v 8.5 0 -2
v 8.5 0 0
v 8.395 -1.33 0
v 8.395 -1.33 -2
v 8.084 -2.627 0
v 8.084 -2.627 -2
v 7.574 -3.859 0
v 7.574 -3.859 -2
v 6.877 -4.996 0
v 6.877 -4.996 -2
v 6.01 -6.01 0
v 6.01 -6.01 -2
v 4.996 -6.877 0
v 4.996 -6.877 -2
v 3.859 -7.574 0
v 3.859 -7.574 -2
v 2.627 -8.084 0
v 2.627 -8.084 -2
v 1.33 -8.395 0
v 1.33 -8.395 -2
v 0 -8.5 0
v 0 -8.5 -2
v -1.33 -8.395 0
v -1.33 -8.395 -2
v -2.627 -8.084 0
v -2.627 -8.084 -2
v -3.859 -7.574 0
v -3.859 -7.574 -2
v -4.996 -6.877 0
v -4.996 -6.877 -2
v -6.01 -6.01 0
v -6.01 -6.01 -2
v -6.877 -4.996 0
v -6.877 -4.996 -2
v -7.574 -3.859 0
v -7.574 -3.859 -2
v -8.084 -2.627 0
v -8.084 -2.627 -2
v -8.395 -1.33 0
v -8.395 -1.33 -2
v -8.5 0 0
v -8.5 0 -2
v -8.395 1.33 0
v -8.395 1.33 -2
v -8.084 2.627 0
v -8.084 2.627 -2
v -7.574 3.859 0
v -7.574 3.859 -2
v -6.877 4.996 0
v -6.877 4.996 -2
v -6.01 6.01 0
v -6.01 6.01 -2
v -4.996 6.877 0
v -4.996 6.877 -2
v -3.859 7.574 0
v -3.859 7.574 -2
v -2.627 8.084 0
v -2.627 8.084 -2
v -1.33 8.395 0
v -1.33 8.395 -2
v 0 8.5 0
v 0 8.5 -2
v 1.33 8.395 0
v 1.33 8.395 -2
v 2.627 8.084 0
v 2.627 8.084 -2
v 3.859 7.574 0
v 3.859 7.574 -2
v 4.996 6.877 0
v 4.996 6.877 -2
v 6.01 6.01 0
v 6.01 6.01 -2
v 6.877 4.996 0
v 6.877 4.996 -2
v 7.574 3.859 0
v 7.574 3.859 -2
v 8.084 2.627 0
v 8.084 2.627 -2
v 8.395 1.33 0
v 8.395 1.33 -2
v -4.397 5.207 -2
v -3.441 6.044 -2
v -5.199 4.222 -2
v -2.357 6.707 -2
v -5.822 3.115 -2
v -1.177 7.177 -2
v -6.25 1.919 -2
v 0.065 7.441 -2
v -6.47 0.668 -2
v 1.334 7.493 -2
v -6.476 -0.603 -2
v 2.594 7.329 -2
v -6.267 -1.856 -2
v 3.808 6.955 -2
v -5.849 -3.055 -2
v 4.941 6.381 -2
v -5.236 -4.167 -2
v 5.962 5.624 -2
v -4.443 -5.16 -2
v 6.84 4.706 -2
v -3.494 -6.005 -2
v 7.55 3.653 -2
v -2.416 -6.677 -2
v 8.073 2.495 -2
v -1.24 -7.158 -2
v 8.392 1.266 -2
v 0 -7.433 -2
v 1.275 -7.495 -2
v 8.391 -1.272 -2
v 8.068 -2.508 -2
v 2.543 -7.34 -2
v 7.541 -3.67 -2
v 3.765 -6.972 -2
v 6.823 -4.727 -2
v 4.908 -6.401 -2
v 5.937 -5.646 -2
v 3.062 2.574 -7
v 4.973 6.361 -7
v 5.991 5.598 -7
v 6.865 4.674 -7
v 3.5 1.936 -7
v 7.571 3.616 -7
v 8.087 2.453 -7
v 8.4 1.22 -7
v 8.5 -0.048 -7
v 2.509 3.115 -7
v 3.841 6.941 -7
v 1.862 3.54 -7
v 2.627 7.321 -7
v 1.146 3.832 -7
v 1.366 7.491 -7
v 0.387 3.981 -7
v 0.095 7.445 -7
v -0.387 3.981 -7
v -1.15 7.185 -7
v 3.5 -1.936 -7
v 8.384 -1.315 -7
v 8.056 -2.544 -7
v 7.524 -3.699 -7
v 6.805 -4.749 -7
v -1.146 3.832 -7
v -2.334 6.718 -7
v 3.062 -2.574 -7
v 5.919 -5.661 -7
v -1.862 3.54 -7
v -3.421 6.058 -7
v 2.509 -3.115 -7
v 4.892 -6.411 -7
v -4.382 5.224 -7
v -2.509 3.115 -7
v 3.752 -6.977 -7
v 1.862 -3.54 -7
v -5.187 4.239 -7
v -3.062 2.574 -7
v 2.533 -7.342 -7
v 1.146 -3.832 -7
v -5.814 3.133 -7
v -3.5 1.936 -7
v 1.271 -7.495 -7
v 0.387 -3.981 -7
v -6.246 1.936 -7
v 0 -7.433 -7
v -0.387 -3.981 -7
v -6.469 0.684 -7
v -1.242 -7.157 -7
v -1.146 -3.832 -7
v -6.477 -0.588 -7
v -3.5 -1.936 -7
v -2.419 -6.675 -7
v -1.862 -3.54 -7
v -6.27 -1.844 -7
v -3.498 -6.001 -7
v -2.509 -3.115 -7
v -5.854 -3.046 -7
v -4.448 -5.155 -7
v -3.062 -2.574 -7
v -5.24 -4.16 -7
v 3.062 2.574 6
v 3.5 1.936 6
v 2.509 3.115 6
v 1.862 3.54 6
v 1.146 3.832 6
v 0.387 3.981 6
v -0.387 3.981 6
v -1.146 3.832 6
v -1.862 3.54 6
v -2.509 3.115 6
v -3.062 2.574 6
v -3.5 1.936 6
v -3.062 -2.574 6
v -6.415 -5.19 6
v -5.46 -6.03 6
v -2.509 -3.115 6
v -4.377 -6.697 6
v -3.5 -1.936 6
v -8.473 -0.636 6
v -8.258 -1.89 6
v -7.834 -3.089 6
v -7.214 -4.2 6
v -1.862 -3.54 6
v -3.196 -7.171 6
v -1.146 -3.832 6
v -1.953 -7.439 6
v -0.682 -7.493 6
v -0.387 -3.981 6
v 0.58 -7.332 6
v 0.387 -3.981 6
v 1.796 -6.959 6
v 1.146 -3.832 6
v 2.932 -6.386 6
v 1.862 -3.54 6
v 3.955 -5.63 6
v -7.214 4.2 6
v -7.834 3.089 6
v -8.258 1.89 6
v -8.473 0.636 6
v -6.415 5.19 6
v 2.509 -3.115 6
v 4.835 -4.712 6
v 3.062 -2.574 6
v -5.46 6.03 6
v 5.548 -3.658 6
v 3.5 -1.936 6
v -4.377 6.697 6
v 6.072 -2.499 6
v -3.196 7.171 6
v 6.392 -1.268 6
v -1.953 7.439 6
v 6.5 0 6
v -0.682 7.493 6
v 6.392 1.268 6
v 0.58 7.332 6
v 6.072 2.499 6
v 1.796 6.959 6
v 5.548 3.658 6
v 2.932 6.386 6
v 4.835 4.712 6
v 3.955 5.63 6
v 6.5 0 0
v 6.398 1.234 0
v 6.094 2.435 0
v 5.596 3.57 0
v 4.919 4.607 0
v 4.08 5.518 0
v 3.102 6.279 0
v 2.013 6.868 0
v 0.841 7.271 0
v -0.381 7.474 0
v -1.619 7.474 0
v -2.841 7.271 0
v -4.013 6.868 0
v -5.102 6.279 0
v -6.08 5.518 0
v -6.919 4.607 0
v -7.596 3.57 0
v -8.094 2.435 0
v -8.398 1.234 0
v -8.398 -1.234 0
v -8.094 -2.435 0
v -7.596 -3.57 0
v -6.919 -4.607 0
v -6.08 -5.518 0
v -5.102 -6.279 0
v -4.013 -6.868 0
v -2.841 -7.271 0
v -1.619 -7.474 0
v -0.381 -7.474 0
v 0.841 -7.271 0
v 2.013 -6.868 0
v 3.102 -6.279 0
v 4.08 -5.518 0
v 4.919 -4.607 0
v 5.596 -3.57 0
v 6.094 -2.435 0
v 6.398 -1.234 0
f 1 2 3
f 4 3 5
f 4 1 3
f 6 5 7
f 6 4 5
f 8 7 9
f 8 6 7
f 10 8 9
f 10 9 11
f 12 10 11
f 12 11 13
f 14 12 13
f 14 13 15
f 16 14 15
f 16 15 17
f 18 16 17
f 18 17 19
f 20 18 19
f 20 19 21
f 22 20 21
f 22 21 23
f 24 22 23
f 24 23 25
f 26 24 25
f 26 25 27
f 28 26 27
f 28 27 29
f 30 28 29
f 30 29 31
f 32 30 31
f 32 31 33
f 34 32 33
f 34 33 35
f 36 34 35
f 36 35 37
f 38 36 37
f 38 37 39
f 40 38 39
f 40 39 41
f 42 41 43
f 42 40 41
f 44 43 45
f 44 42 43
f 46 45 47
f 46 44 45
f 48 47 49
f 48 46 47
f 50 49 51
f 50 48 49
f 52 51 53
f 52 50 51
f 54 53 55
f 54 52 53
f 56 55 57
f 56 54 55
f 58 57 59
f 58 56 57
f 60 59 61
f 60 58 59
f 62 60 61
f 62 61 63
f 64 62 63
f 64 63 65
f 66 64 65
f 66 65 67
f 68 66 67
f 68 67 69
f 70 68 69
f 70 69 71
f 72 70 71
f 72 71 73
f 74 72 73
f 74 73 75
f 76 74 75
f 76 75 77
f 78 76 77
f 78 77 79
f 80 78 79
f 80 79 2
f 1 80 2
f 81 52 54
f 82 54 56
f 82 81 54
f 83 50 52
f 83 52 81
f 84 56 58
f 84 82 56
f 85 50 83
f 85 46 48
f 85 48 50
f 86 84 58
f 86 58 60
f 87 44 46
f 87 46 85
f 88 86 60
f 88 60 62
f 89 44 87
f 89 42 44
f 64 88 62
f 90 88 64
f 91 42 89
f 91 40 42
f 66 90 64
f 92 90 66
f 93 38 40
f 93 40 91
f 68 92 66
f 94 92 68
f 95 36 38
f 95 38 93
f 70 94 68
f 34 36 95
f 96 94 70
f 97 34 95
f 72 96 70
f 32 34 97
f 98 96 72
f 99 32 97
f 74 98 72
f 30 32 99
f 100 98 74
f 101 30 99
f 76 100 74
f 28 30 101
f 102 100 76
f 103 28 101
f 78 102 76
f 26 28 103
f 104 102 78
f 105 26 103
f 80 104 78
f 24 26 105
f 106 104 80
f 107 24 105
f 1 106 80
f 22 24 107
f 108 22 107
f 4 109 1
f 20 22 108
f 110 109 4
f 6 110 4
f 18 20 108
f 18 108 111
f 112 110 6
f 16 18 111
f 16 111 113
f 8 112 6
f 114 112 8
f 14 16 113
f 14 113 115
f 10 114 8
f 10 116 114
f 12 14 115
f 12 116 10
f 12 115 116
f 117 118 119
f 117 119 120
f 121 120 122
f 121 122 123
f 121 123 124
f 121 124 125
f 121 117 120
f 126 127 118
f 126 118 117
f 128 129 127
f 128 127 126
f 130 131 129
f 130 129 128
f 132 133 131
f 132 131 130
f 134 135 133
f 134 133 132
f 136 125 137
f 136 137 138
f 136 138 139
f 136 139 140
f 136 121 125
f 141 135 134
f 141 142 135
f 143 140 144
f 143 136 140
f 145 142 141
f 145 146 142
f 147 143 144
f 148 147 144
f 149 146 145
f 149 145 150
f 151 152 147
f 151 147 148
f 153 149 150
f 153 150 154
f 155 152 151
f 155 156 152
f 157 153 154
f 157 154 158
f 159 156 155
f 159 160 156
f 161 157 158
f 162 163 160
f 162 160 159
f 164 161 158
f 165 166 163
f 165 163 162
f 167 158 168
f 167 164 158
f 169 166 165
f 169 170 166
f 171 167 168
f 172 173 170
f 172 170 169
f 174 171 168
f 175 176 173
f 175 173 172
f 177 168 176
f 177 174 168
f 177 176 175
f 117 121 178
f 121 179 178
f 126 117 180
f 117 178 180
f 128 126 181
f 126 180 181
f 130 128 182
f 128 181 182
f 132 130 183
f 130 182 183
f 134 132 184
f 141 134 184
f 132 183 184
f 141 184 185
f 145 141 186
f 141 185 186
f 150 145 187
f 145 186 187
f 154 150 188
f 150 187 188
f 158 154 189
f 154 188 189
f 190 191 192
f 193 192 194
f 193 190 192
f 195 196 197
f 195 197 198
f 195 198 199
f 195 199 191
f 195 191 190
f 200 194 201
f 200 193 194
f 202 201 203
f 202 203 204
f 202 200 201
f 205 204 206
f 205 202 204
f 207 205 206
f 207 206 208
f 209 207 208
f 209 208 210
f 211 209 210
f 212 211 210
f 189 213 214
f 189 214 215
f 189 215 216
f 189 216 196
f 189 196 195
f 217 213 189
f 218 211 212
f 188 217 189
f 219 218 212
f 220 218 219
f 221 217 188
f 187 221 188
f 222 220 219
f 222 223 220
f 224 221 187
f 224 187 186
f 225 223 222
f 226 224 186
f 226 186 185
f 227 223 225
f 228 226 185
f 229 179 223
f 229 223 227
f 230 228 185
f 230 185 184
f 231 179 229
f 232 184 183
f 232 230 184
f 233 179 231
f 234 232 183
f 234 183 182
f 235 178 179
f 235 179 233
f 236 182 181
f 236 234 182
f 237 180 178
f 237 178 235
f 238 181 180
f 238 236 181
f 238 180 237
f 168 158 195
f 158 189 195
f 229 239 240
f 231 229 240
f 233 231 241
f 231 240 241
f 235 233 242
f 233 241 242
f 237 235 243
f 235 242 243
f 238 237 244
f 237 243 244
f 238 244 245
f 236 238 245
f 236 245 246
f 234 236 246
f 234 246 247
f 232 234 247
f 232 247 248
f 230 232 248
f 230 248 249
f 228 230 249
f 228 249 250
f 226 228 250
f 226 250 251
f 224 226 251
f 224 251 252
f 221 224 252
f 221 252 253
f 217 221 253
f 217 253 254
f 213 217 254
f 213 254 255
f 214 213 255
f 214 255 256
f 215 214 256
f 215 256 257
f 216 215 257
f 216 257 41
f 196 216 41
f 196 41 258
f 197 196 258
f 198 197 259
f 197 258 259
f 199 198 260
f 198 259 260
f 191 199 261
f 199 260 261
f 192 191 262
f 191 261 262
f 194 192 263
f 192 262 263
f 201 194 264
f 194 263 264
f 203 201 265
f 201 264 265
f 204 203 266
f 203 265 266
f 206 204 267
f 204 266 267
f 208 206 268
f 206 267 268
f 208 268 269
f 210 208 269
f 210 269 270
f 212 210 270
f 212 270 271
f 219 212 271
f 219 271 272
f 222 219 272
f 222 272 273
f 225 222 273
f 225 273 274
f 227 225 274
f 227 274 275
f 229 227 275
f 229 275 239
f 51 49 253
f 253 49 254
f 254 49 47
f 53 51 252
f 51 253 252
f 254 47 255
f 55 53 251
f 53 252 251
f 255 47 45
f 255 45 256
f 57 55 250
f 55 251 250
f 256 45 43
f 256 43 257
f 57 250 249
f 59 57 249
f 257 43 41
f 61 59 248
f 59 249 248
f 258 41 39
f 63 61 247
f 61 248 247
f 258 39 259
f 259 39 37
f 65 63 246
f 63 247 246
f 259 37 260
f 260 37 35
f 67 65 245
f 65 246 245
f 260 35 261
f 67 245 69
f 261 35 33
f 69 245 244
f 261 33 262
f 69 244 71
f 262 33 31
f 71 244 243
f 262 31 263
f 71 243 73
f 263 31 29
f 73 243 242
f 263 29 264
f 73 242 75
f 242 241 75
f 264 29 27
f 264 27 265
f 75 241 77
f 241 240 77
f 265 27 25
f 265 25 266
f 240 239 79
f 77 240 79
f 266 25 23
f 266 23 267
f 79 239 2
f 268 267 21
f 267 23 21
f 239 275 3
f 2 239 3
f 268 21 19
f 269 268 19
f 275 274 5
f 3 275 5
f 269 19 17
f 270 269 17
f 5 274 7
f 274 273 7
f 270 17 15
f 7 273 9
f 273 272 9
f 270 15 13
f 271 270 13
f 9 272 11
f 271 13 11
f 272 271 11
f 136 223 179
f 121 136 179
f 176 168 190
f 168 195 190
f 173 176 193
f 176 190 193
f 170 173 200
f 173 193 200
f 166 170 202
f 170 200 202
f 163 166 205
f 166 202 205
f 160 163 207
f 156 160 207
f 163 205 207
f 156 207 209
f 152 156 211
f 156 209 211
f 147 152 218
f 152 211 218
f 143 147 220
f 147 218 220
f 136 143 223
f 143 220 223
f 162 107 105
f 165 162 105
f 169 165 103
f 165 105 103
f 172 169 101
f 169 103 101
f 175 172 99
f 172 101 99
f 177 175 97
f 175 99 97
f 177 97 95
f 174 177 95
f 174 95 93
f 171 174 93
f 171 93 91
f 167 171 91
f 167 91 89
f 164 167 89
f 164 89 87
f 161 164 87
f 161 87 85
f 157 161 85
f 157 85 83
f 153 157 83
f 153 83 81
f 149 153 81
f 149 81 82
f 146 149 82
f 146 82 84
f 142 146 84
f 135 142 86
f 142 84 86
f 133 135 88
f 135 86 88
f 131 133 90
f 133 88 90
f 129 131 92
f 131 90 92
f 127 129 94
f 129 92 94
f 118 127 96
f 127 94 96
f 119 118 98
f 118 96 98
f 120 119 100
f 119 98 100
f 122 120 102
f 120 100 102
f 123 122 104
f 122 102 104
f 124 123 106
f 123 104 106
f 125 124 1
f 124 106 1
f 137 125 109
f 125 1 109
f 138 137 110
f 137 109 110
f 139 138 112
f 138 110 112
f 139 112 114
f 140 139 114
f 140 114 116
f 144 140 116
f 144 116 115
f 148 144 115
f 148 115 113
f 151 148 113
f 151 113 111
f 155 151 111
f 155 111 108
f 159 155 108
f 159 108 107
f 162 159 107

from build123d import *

# Parameters (mm, degrees)
SKETCH1_R           = 7.5
BOSS_EXTRUDE1_DEPTH = 6
SKETCH2_R           = 7.5
BOSS_EXTRUDE2_DEPTH = 7
CUT_EXTRUDE1_DEPTH  = 14.322912594
BOSS_EXTRUDE3_START = 2
SKETCH4_R           = 8.5
BOSS_EXTRUDE3_DEPTH = 2


with BuildPart() as part:
    # Sketch1 → Boss-Extrude1 (new body)
    with BuildSketch(Plane.XY):
        with Locations((-1, 0)):
            Circle(SKETCH1_R)
        with BuildLine():
            Line((3.5, -1.936491673), (3.5, 1.936491673))
            ThreePointArc((3.5, 1.936491673), (0, 4), (-3.5, 1.936491673))
            Line((-3.5, 1.936491673), (-3.5, -1.936491673))
            ThreePointArc((-3.5, -1.936491673), (0, -4), (3.5, -1.936491673))
        make_face(mode=Mode.SUBTRACT)
    extrude(amount=BOSS_EXTRUDE1_DEPTH)

    # Sketch2 → Boss-Extrude2 (add)
    with BuildSketch(Plane(origin=(0, 0, 0), x_dir=(-1, 0, 0), z_dir=(0, 0, -1))):
        with Locations((-1, 0)):
            Circle(SKETCH2_R)
    extrude(amount=BOSS_EXTRUDE2_DEPTH)

    # Sketch3 → Cut-Extrude1 (cut, through all)
    with BuildSketch(Plane.XY):
        with BuildLine():
            Line((3.5, -1.936491673), (3.5, 1.936491673))
            ThreePointArc((3.5, 1.936491673), (0, 4), (-3.5, 1.936491673))
            Line((-3.5, 1.936491673), (-3.5, -1.936491673))
            ThreePointArc((-3.5, -1.936491673), (0, -4), (3.5, -1.936491673))
        make_face()
    extrude(amount=-CUT_EXTRUDE1_DEPTH, mode=Mode.SUBTRACT)

    # Sketch4 → Boss-Extrude3 (add)
    with BuildSketch(Plane(origin=(0, 0, 0), x_dir=(-1, 0, 0), z_dir=(0, 0, -1)).offset(BOSS_EXTRUDE3_START)):
        Circle(SKETCH4_R)
        with BuildLine():
            Line((3.5, 1.936491673), (3.5, -1.936491673))
            ThreePointArc((3.5, -1.936491673), (0, -4), (-3.5, -1.936491673))
            Line((-3.5, -1.936491673), (-3.5, 1.936491673))
            ThreePointArc((-3.5, 1.936491673), (0, 4), (3.5, 1.936491673))
        make_face(mode=Mode.SUBTRACT)
    extrude(amount=-BOSS_EXTRUDE3_DEPTH)


solid = part.part
